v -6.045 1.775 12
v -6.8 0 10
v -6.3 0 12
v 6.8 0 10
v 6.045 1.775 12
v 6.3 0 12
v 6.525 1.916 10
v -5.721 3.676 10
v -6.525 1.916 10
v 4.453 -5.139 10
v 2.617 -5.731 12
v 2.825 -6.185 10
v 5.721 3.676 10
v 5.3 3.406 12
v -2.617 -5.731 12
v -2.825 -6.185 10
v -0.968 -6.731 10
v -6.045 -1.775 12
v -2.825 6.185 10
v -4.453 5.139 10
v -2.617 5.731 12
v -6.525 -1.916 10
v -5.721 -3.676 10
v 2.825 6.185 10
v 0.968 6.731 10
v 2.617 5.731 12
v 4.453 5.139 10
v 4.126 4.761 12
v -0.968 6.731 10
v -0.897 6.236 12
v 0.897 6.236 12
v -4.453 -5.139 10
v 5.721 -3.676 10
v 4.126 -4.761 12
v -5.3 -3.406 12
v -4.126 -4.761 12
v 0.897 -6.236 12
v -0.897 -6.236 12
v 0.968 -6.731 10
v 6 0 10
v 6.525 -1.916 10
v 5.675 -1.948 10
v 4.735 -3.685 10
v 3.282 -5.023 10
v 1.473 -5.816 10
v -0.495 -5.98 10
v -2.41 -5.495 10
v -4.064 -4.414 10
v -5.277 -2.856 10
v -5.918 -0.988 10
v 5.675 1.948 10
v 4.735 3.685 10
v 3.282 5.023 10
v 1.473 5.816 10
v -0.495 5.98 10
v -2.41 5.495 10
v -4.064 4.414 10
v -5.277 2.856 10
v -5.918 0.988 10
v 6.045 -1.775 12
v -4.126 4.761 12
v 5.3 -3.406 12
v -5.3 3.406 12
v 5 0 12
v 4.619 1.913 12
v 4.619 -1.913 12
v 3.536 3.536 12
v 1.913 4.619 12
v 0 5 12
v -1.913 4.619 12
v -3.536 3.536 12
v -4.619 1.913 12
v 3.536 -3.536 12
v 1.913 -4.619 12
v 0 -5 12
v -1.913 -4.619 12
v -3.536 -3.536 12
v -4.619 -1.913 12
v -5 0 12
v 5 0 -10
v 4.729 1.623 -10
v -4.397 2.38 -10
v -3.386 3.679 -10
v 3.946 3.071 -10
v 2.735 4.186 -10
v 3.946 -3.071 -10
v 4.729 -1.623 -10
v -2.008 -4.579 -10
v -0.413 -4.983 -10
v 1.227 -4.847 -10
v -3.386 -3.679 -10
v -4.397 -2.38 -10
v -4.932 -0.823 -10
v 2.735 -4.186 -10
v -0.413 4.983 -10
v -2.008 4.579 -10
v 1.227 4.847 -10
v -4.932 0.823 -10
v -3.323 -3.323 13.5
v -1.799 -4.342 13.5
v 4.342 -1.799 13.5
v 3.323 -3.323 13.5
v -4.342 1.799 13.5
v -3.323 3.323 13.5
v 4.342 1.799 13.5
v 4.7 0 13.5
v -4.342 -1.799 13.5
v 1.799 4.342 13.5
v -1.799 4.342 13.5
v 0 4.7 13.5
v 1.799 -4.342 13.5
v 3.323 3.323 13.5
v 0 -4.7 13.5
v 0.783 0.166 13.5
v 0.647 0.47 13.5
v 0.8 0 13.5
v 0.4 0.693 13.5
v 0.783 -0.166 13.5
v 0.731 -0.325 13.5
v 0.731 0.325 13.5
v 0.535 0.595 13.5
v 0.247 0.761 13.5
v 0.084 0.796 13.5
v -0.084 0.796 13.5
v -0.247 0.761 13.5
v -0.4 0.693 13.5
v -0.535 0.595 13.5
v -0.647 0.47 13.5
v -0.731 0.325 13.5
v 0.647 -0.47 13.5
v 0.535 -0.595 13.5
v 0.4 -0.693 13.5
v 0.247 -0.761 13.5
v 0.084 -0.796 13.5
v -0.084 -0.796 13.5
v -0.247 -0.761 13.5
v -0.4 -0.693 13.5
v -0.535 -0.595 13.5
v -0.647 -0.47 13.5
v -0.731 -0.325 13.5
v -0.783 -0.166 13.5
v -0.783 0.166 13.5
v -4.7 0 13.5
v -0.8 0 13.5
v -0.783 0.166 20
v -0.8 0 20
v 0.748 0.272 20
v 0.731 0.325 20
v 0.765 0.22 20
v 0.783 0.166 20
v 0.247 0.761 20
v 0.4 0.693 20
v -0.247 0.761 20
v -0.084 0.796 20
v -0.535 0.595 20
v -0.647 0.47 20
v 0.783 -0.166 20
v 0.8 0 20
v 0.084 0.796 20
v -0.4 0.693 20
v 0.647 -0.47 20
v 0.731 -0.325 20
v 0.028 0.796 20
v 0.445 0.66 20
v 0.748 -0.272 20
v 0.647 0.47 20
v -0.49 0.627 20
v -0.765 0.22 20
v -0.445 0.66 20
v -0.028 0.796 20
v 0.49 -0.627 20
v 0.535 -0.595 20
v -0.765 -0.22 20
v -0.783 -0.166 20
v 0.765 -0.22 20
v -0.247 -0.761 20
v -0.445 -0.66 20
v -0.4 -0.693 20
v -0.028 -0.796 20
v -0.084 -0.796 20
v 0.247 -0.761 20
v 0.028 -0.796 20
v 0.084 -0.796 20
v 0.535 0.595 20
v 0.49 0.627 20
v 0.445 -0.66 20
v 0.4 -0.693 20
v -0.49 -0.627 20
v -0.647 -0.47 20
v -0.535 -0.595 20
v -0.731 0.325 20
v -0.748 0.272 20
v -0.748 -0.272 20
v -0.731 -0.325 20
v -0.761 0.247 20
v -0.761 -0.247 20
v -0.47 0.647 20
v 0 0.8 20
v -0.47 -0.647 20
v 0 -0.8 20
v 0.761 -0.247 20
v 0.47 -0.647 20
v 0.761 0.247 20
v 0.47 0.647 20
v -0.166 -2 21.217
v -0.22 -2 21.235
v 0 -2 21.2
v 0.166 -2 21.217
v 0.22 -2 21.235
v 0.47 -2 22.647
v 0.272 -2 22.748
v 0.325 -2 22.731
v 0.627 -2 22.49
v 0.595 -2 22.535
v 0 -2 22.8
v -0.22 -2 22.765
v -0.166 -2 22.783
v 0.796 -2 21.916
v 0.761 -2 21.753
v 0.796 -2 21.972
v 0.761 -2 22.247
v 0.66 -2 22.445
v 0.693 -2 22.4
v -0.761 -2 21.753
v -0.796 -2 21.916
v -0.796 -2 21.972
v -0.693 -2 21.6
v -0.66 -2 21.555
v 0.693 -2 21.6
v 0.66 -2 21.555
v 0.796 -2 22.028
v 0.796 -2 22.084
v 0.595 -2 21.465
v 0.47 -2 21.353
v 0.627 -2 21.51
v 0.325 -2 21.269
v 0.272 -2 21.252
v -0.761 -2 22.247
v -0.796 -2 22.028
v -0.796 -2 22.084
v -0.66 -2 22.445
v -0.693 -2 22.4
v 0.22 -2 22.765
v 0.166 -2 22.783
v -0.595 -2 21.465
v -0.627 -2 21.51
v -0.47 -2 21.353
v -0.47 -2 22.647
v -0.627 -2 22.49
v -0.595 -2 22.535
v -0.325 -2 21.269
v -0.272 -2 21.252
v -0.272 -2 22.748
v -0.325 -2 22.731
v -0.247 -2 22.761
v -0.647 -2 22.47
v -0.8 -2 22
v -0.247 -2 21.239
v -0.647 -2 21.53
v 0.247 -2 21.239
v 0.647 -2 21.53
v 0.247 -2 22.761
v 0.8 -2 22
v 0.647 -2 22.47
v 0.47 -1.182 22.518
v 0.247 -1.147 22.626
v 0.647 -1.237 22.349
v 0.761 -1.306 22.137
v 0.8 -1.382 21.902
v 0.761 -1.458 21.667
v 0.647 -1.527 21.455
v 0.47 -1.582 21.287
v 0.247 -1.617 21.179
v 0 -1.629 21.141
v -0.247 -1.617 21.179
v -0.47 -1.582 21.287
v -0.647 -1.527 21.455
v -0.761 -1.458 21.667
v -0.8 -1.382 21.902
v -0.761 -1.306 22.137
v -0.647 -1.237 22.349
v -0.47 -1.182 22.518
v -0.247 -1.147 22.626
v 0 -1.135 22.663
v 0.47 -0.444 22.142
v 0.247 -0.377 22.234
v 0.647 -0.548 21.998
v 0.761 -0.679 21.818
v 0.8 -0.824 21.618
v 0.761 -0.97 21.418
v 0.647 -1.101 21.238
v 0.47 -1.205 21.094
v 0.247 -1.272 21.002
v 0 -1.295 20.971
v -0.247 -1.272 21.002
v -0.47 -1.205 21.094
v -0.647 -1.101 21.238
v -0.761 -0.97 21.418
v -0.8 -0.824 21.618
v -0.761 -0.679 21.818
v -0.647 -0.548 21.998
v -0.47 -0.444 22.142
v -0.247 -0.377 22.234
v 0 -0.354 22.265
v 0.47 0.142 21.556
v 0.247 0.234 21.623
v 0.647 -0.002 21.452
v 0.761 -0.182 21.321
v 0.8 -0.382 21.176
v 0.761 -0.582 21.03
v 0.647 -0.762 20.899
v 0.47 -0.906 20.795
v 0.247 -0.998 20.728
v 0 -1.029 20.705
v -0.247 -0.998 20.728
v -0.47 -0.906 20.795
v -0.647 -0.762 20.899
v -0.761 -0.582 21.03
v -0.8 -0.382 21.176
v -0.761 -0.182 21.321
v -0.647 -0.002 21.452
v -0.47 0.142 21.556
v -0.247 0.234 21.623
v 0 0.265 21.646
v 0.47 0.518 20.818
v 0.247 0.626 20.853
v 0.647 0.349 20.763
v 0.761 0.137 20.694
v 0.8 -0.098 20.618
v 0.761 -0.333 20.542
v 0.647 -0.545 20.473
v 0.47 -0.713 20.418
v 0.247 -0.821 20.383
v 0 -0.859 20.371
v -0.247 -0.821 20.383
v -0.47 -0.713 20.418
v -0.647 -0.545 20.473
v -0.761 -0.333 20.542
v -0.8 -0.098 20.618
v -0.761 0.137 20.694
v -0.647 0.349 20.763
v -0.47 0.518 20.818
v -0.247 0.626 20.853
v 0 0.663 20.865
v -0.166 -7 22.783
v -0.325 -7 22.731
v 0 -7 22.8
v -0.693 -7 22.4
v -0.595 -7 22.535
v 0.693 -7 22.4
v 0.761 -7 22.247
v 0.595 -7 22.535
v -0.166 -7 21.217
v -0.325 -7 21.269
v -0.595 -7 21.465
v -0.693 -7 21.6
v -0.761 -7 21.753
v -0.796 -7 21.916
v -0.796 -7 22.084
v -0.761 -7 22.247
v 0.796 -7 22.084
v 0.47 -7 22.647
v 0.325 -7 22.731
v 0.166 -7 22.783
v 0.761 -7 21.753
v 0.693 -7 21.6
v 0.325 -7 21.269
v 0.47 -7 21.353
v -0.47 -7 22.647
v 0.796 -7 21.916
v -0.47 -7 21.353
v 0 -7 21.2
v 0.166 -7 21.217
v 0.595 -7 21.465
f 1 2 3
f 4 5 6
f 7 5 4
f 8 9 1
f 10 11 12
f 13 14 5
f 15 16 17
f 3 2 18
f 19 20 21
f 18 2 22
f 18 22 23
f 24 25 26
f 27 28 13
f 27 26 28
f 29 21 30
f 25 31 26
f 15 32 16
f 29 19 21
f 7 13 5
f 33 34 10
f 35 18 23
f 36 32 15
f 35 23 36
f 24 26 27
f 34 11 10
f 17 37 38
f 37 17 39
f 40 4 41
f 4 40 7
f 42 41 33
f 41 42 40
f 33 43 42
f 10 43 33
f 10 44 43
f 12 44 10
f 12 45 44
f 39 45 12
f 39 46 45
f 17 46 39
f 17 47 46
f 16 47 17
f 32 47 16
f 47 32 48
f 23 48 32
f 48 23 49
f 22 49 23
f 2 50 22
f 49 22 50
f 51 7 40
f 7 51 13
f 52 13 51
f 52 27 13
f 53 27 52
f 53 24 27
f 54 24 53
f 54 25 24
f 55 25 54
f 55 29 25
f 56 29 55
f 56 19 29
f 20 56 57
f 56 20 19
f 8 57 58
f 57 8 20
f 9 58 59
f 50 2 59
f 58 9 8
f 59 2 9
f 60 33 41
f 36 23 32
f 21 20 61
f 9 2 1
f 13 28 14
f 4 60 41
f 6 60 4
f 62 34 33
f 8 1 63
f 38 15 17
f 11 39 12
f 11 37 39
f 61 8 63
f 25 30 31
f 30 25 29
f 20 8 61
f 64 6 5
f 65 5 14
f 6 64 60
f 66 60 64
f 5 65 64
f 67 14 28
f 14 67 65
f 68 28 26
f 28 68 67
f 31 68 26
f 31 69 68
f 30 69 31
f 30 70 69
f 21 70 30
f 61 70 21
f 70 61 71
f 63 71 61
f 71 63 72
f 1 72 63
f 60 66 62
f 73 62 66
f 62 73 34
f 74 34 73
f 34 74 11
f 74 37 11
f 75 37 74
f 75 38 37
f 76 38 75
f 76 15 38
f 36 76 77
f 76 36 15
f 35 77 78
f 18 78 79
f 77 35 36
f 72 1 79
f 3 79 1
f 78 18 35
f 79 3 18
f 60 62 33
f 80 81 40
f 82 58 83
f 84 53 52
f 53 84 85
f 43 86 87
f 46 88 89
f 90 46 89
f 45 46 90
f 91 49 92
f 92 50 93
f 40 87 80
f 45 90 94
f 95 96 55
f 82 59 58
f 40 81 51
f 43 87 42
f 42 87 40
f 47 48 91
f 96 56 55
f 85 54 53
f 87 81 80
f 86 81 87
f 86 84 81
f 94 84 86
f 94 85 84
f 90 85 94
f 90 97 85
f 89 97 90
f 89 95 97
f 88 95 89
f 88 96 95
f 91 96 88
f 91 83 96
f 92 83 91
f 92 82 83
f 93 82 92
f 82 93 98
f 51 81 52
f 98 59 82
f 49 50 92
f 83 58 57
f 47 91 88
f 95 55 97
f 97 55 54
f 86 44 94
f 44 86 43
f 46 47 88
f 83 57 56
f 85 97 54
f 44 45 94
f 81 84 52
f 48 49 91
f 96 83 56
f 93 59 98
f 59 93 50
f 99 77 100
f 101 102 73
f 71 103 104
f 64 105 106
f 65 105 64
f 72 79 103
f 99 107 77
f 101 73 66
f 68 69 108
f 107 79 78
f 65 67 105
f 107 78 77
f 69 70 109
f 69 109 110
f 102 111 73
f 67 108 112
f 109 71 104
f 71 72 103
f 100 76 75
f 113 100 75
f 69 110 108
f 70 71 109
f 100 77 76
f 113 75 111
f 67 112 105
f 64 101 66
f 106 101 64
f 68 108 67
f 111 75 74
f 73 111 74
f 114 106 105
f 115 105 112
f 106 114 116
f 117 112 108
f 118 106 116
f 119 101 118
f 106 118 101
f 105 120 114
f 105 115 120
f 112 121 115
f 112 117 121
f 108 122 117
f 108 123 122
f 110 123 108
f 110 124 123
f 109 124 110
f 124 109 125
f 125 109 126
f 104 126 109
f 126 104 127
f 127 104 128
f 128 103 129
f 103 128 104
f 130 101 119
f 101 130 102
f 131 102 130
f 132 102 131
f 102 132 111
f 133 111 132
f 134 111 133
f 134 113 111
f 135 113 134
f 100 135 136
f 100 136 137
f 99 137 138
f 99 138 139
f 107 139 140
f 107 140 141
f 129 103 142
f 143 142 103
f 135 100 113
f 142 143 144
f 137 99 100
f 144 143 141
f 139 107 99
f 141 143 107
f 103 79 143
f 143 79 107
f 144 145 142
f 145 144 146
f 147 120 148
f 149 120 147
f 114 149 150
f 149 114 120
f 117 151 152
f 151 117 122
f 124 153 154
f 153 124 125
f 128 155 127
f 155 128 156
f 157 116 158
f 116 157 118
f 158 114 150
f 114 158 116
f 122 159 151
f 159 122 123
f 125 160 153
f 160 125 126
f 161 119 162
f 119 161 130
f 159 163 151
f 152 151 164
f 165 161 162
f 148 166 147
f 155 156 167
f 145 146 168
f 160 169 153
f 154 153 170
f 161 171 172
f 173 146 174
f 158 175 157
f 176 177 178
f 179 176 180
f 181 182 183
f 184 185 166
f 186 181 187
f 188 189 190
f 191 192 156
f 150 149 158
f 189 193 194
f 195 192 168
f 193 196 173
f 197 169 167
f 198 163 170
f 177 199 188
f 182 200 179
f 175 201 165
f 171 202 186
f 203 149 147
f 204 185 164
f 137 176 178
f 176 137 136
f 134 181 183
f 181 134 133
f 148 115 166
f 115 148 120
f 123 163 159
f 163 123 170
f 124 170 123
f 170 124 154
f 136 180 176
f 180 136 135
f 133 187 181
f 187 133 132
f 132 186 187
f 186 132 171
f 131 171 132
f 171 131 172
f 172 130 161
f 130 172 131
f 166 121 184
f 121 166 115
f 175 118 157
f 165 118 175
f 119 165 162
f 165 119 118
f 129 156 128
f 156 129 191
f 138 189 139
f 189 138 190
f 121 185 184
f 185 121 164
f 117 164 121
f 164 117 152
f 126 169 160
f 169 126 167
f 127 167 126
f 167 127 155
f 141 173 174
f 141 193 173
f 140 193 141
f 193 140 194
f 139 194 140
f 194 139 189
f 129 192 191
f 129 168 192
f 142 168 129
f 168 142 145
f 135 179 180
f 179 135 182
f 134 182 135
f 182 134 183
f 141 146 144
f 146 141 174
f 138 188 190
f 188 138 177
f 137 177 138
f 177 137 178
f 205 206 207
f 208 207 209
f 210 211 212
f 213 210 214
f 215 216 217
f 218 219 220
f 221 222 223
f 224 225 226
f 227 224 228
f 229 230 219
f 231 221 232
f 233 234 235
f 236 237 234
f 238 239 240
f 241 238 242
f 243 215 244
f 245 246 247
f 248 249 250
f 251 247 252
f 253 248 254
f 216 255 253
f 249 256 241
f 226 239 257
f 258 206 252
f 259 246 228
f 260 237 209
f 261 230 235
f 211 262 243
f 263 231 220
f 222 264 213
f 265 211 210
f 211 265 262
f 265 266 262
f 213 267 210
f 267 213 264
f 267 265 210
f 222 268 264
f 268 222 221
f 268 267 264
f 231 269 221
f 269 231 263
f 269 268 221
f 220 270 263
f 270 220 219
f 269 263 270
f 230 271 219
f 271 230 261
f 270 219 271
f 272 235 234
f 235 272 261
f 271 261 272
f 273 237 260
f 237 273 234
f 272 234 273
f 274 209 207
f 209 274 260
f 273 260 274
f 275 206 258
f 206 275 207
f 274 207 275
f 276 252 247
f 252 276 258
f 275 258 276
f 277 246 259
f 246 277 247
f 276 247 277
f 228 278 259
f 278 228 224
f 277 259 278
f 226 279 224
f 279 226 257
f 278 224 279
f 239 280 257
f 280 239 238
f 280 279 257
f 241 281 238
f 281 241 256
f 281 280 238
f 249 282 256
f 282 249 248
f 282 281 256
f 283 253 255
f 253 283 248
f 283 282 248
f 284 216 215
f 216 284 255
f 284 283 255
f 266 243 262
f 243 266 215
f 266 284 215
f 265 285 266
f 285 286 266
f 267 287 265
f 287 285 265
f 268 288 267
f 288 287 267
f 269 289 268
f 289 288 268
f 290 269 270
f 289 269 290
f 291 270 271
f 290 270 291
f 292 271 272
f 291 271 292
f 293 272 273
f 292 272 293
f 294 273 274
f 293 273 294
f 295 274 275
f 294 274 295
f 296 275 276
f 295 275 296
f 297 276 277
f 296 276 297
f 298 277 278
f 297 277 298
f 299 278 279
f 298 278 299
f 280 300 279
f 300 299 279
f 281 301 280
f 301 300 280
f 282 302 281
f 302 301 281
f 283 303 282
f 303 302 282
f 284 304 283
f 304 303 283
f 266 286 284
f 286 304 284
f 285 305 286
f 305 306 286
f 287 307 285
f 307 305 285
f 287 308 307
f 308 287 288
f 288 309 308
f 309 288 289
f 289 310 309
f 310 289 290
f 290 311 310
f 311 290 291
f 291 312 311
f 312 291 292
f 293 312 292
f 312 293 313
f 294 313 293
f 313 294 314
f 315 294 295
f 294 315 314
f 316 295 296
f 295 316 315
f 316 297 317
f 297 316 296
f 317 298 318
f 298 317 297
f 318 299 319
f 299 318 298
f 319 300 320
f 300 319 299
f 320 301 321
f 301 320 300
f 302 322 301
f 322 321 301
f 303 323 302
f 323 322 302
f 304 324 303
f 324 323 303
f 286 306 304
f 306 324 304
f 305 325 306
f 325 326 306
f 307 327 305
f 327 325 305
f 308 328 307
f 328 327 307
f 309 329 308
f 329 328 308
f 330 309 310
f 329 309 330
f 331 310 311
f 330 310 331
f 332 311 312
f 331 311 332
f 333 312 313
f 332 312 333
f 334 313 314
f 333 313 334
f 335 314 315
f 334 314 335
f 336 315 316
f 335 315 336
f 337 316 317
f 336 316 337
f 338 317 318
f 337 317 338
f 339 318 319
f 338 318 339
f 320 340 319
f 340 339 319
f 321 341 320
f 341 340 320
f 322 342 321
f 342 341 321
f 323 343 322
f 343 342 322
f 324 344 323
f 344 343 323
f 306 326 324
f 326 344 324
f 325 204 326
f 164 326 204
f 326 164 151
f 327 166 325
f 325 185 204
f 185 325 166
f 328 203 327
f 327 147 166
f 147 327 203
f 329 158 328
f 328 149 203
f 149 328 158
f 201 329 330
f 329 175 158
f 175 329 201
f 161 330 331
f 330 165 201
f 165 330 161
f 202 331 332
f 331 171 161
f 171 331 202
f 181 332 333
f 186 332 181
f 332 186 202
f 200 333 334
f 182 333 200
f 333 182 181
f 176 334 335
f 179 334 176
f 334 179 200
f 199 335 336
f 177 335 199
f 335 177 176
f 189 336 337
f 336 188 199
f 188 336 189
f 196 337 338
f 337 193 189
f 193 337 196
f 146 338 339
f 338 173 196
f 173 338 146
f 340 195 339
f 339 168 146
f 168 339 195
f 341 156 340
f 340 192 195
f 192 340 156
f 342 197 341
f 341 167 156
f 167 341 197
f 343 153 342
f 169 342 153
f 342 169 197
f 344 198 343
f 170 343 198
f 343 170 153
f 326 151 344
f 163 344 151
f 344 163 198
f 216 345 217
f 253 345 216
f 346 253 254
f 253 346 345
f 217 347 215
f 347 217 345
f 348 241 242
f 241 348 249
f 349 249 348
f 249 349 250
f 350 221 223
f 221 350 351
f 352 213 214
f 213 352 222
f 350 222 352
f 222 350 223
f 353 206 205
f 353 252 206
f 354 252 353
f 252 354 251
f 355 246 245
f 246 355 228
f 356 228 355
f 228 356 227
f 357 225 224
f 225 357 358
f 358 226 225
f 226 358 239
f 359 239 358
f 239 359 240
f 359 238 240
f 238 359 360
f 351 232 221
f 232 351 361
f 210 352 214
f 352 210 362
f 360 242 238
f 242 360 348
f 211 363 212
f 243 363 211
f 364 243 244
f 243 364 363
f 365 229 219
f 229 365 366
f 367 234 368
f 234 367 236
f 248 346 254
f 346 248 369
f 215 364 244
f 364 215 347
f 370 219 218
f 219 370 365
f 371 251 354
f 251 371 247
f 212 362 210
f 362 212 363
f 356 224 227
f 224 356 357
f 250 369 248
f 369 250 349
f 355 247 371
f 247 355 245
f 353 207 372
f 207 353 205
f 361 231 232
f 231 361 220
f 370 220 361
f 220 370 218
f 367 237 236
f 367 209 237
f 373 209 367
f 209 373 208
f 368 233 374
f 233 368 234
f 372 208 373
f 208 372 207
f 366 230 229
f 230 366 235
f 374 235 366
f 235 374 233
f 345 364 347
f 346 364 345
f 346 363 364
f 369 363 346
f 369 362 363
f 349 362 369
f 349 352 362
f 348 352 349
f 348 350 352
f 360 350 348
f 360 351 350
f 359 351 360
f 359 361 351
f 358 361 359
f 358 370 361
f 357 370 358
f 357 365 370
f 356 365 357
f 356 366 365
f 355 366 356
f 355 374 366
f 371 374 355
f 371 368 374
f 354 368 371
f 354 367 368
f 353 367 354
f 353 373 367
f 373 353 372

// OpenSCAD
module Soda_Cup_01(){

    color("white"){
    translate([0,0,10])
    cylinder(2,6.8,6.3);
    }

    color("#dbceb2"){
    cylinder(20,5,6, center = true);
    }

    color("white"){
    translate([0,0,12])
    cylinder(1.5,5,4.7);
    }

    color("black"){
    translate([0,0,12])
    cylinder(8,0.8,0.8, $fn = 30);
    }

    translate([0,-2, 20])
    rotate([0,-90,0])
    color("black")
    rotate_extrude(angle = 90, $fn = 20){
    translate([2, 0, 0])
    circle(r = 0.8 ,$fn = 20);
    }

    rotate([0,-90,90])
    color("black"){
    translate([22,0,2])
    cylinder(5,0.8,0.8, $fn = 30);
    }

}

Soda_Cup_01();

// Written by Nicolì Angelo (Gengio) 2024: 
// MIT License

//Permission is hereby granted, free of charge, to any person obtaining a copy of this software and associated documentation files (the "Software"), to deal in the Software without restriction, including without limitation the rights to use, copy, modify, merge, publish, distribute, sublicense, and/or sell copies of the Software, and to permit persons to whom the Software is furnished to do so, subject to the following conditions:

//The above copyright notice and this permission notice shall be included in all copies or substantial portions of the Software.

//THE SOFTWARE IS PROVIDED "AS IS", WITHOUT WARRANTY OF ANY KIND, EXPRESS OR IMPLIED, INCLUDING BUT NOT LIMITED TO THE WARRANTIES OF MERCHANTABILITY, FITNESS FOR A PARTICULAR PURPOSE AND NONINFRINGEMENT. IN NO EVENT SHALL THE AUTHORS OR COPYRIGHT HOLDERS BE LIABLE FOR ANY CLAIM, DAMAGES OR OTHER LIABILITY, WHETHER IN AN ACTION OF CONTRACT, TORT OR OTHERWISE, ARISING FROM, OUT OF OR IN CONNECTION WITH THE SOFTWARE OR THE USE OR OTHER DEALINGS IN THE SOFTWARE.
